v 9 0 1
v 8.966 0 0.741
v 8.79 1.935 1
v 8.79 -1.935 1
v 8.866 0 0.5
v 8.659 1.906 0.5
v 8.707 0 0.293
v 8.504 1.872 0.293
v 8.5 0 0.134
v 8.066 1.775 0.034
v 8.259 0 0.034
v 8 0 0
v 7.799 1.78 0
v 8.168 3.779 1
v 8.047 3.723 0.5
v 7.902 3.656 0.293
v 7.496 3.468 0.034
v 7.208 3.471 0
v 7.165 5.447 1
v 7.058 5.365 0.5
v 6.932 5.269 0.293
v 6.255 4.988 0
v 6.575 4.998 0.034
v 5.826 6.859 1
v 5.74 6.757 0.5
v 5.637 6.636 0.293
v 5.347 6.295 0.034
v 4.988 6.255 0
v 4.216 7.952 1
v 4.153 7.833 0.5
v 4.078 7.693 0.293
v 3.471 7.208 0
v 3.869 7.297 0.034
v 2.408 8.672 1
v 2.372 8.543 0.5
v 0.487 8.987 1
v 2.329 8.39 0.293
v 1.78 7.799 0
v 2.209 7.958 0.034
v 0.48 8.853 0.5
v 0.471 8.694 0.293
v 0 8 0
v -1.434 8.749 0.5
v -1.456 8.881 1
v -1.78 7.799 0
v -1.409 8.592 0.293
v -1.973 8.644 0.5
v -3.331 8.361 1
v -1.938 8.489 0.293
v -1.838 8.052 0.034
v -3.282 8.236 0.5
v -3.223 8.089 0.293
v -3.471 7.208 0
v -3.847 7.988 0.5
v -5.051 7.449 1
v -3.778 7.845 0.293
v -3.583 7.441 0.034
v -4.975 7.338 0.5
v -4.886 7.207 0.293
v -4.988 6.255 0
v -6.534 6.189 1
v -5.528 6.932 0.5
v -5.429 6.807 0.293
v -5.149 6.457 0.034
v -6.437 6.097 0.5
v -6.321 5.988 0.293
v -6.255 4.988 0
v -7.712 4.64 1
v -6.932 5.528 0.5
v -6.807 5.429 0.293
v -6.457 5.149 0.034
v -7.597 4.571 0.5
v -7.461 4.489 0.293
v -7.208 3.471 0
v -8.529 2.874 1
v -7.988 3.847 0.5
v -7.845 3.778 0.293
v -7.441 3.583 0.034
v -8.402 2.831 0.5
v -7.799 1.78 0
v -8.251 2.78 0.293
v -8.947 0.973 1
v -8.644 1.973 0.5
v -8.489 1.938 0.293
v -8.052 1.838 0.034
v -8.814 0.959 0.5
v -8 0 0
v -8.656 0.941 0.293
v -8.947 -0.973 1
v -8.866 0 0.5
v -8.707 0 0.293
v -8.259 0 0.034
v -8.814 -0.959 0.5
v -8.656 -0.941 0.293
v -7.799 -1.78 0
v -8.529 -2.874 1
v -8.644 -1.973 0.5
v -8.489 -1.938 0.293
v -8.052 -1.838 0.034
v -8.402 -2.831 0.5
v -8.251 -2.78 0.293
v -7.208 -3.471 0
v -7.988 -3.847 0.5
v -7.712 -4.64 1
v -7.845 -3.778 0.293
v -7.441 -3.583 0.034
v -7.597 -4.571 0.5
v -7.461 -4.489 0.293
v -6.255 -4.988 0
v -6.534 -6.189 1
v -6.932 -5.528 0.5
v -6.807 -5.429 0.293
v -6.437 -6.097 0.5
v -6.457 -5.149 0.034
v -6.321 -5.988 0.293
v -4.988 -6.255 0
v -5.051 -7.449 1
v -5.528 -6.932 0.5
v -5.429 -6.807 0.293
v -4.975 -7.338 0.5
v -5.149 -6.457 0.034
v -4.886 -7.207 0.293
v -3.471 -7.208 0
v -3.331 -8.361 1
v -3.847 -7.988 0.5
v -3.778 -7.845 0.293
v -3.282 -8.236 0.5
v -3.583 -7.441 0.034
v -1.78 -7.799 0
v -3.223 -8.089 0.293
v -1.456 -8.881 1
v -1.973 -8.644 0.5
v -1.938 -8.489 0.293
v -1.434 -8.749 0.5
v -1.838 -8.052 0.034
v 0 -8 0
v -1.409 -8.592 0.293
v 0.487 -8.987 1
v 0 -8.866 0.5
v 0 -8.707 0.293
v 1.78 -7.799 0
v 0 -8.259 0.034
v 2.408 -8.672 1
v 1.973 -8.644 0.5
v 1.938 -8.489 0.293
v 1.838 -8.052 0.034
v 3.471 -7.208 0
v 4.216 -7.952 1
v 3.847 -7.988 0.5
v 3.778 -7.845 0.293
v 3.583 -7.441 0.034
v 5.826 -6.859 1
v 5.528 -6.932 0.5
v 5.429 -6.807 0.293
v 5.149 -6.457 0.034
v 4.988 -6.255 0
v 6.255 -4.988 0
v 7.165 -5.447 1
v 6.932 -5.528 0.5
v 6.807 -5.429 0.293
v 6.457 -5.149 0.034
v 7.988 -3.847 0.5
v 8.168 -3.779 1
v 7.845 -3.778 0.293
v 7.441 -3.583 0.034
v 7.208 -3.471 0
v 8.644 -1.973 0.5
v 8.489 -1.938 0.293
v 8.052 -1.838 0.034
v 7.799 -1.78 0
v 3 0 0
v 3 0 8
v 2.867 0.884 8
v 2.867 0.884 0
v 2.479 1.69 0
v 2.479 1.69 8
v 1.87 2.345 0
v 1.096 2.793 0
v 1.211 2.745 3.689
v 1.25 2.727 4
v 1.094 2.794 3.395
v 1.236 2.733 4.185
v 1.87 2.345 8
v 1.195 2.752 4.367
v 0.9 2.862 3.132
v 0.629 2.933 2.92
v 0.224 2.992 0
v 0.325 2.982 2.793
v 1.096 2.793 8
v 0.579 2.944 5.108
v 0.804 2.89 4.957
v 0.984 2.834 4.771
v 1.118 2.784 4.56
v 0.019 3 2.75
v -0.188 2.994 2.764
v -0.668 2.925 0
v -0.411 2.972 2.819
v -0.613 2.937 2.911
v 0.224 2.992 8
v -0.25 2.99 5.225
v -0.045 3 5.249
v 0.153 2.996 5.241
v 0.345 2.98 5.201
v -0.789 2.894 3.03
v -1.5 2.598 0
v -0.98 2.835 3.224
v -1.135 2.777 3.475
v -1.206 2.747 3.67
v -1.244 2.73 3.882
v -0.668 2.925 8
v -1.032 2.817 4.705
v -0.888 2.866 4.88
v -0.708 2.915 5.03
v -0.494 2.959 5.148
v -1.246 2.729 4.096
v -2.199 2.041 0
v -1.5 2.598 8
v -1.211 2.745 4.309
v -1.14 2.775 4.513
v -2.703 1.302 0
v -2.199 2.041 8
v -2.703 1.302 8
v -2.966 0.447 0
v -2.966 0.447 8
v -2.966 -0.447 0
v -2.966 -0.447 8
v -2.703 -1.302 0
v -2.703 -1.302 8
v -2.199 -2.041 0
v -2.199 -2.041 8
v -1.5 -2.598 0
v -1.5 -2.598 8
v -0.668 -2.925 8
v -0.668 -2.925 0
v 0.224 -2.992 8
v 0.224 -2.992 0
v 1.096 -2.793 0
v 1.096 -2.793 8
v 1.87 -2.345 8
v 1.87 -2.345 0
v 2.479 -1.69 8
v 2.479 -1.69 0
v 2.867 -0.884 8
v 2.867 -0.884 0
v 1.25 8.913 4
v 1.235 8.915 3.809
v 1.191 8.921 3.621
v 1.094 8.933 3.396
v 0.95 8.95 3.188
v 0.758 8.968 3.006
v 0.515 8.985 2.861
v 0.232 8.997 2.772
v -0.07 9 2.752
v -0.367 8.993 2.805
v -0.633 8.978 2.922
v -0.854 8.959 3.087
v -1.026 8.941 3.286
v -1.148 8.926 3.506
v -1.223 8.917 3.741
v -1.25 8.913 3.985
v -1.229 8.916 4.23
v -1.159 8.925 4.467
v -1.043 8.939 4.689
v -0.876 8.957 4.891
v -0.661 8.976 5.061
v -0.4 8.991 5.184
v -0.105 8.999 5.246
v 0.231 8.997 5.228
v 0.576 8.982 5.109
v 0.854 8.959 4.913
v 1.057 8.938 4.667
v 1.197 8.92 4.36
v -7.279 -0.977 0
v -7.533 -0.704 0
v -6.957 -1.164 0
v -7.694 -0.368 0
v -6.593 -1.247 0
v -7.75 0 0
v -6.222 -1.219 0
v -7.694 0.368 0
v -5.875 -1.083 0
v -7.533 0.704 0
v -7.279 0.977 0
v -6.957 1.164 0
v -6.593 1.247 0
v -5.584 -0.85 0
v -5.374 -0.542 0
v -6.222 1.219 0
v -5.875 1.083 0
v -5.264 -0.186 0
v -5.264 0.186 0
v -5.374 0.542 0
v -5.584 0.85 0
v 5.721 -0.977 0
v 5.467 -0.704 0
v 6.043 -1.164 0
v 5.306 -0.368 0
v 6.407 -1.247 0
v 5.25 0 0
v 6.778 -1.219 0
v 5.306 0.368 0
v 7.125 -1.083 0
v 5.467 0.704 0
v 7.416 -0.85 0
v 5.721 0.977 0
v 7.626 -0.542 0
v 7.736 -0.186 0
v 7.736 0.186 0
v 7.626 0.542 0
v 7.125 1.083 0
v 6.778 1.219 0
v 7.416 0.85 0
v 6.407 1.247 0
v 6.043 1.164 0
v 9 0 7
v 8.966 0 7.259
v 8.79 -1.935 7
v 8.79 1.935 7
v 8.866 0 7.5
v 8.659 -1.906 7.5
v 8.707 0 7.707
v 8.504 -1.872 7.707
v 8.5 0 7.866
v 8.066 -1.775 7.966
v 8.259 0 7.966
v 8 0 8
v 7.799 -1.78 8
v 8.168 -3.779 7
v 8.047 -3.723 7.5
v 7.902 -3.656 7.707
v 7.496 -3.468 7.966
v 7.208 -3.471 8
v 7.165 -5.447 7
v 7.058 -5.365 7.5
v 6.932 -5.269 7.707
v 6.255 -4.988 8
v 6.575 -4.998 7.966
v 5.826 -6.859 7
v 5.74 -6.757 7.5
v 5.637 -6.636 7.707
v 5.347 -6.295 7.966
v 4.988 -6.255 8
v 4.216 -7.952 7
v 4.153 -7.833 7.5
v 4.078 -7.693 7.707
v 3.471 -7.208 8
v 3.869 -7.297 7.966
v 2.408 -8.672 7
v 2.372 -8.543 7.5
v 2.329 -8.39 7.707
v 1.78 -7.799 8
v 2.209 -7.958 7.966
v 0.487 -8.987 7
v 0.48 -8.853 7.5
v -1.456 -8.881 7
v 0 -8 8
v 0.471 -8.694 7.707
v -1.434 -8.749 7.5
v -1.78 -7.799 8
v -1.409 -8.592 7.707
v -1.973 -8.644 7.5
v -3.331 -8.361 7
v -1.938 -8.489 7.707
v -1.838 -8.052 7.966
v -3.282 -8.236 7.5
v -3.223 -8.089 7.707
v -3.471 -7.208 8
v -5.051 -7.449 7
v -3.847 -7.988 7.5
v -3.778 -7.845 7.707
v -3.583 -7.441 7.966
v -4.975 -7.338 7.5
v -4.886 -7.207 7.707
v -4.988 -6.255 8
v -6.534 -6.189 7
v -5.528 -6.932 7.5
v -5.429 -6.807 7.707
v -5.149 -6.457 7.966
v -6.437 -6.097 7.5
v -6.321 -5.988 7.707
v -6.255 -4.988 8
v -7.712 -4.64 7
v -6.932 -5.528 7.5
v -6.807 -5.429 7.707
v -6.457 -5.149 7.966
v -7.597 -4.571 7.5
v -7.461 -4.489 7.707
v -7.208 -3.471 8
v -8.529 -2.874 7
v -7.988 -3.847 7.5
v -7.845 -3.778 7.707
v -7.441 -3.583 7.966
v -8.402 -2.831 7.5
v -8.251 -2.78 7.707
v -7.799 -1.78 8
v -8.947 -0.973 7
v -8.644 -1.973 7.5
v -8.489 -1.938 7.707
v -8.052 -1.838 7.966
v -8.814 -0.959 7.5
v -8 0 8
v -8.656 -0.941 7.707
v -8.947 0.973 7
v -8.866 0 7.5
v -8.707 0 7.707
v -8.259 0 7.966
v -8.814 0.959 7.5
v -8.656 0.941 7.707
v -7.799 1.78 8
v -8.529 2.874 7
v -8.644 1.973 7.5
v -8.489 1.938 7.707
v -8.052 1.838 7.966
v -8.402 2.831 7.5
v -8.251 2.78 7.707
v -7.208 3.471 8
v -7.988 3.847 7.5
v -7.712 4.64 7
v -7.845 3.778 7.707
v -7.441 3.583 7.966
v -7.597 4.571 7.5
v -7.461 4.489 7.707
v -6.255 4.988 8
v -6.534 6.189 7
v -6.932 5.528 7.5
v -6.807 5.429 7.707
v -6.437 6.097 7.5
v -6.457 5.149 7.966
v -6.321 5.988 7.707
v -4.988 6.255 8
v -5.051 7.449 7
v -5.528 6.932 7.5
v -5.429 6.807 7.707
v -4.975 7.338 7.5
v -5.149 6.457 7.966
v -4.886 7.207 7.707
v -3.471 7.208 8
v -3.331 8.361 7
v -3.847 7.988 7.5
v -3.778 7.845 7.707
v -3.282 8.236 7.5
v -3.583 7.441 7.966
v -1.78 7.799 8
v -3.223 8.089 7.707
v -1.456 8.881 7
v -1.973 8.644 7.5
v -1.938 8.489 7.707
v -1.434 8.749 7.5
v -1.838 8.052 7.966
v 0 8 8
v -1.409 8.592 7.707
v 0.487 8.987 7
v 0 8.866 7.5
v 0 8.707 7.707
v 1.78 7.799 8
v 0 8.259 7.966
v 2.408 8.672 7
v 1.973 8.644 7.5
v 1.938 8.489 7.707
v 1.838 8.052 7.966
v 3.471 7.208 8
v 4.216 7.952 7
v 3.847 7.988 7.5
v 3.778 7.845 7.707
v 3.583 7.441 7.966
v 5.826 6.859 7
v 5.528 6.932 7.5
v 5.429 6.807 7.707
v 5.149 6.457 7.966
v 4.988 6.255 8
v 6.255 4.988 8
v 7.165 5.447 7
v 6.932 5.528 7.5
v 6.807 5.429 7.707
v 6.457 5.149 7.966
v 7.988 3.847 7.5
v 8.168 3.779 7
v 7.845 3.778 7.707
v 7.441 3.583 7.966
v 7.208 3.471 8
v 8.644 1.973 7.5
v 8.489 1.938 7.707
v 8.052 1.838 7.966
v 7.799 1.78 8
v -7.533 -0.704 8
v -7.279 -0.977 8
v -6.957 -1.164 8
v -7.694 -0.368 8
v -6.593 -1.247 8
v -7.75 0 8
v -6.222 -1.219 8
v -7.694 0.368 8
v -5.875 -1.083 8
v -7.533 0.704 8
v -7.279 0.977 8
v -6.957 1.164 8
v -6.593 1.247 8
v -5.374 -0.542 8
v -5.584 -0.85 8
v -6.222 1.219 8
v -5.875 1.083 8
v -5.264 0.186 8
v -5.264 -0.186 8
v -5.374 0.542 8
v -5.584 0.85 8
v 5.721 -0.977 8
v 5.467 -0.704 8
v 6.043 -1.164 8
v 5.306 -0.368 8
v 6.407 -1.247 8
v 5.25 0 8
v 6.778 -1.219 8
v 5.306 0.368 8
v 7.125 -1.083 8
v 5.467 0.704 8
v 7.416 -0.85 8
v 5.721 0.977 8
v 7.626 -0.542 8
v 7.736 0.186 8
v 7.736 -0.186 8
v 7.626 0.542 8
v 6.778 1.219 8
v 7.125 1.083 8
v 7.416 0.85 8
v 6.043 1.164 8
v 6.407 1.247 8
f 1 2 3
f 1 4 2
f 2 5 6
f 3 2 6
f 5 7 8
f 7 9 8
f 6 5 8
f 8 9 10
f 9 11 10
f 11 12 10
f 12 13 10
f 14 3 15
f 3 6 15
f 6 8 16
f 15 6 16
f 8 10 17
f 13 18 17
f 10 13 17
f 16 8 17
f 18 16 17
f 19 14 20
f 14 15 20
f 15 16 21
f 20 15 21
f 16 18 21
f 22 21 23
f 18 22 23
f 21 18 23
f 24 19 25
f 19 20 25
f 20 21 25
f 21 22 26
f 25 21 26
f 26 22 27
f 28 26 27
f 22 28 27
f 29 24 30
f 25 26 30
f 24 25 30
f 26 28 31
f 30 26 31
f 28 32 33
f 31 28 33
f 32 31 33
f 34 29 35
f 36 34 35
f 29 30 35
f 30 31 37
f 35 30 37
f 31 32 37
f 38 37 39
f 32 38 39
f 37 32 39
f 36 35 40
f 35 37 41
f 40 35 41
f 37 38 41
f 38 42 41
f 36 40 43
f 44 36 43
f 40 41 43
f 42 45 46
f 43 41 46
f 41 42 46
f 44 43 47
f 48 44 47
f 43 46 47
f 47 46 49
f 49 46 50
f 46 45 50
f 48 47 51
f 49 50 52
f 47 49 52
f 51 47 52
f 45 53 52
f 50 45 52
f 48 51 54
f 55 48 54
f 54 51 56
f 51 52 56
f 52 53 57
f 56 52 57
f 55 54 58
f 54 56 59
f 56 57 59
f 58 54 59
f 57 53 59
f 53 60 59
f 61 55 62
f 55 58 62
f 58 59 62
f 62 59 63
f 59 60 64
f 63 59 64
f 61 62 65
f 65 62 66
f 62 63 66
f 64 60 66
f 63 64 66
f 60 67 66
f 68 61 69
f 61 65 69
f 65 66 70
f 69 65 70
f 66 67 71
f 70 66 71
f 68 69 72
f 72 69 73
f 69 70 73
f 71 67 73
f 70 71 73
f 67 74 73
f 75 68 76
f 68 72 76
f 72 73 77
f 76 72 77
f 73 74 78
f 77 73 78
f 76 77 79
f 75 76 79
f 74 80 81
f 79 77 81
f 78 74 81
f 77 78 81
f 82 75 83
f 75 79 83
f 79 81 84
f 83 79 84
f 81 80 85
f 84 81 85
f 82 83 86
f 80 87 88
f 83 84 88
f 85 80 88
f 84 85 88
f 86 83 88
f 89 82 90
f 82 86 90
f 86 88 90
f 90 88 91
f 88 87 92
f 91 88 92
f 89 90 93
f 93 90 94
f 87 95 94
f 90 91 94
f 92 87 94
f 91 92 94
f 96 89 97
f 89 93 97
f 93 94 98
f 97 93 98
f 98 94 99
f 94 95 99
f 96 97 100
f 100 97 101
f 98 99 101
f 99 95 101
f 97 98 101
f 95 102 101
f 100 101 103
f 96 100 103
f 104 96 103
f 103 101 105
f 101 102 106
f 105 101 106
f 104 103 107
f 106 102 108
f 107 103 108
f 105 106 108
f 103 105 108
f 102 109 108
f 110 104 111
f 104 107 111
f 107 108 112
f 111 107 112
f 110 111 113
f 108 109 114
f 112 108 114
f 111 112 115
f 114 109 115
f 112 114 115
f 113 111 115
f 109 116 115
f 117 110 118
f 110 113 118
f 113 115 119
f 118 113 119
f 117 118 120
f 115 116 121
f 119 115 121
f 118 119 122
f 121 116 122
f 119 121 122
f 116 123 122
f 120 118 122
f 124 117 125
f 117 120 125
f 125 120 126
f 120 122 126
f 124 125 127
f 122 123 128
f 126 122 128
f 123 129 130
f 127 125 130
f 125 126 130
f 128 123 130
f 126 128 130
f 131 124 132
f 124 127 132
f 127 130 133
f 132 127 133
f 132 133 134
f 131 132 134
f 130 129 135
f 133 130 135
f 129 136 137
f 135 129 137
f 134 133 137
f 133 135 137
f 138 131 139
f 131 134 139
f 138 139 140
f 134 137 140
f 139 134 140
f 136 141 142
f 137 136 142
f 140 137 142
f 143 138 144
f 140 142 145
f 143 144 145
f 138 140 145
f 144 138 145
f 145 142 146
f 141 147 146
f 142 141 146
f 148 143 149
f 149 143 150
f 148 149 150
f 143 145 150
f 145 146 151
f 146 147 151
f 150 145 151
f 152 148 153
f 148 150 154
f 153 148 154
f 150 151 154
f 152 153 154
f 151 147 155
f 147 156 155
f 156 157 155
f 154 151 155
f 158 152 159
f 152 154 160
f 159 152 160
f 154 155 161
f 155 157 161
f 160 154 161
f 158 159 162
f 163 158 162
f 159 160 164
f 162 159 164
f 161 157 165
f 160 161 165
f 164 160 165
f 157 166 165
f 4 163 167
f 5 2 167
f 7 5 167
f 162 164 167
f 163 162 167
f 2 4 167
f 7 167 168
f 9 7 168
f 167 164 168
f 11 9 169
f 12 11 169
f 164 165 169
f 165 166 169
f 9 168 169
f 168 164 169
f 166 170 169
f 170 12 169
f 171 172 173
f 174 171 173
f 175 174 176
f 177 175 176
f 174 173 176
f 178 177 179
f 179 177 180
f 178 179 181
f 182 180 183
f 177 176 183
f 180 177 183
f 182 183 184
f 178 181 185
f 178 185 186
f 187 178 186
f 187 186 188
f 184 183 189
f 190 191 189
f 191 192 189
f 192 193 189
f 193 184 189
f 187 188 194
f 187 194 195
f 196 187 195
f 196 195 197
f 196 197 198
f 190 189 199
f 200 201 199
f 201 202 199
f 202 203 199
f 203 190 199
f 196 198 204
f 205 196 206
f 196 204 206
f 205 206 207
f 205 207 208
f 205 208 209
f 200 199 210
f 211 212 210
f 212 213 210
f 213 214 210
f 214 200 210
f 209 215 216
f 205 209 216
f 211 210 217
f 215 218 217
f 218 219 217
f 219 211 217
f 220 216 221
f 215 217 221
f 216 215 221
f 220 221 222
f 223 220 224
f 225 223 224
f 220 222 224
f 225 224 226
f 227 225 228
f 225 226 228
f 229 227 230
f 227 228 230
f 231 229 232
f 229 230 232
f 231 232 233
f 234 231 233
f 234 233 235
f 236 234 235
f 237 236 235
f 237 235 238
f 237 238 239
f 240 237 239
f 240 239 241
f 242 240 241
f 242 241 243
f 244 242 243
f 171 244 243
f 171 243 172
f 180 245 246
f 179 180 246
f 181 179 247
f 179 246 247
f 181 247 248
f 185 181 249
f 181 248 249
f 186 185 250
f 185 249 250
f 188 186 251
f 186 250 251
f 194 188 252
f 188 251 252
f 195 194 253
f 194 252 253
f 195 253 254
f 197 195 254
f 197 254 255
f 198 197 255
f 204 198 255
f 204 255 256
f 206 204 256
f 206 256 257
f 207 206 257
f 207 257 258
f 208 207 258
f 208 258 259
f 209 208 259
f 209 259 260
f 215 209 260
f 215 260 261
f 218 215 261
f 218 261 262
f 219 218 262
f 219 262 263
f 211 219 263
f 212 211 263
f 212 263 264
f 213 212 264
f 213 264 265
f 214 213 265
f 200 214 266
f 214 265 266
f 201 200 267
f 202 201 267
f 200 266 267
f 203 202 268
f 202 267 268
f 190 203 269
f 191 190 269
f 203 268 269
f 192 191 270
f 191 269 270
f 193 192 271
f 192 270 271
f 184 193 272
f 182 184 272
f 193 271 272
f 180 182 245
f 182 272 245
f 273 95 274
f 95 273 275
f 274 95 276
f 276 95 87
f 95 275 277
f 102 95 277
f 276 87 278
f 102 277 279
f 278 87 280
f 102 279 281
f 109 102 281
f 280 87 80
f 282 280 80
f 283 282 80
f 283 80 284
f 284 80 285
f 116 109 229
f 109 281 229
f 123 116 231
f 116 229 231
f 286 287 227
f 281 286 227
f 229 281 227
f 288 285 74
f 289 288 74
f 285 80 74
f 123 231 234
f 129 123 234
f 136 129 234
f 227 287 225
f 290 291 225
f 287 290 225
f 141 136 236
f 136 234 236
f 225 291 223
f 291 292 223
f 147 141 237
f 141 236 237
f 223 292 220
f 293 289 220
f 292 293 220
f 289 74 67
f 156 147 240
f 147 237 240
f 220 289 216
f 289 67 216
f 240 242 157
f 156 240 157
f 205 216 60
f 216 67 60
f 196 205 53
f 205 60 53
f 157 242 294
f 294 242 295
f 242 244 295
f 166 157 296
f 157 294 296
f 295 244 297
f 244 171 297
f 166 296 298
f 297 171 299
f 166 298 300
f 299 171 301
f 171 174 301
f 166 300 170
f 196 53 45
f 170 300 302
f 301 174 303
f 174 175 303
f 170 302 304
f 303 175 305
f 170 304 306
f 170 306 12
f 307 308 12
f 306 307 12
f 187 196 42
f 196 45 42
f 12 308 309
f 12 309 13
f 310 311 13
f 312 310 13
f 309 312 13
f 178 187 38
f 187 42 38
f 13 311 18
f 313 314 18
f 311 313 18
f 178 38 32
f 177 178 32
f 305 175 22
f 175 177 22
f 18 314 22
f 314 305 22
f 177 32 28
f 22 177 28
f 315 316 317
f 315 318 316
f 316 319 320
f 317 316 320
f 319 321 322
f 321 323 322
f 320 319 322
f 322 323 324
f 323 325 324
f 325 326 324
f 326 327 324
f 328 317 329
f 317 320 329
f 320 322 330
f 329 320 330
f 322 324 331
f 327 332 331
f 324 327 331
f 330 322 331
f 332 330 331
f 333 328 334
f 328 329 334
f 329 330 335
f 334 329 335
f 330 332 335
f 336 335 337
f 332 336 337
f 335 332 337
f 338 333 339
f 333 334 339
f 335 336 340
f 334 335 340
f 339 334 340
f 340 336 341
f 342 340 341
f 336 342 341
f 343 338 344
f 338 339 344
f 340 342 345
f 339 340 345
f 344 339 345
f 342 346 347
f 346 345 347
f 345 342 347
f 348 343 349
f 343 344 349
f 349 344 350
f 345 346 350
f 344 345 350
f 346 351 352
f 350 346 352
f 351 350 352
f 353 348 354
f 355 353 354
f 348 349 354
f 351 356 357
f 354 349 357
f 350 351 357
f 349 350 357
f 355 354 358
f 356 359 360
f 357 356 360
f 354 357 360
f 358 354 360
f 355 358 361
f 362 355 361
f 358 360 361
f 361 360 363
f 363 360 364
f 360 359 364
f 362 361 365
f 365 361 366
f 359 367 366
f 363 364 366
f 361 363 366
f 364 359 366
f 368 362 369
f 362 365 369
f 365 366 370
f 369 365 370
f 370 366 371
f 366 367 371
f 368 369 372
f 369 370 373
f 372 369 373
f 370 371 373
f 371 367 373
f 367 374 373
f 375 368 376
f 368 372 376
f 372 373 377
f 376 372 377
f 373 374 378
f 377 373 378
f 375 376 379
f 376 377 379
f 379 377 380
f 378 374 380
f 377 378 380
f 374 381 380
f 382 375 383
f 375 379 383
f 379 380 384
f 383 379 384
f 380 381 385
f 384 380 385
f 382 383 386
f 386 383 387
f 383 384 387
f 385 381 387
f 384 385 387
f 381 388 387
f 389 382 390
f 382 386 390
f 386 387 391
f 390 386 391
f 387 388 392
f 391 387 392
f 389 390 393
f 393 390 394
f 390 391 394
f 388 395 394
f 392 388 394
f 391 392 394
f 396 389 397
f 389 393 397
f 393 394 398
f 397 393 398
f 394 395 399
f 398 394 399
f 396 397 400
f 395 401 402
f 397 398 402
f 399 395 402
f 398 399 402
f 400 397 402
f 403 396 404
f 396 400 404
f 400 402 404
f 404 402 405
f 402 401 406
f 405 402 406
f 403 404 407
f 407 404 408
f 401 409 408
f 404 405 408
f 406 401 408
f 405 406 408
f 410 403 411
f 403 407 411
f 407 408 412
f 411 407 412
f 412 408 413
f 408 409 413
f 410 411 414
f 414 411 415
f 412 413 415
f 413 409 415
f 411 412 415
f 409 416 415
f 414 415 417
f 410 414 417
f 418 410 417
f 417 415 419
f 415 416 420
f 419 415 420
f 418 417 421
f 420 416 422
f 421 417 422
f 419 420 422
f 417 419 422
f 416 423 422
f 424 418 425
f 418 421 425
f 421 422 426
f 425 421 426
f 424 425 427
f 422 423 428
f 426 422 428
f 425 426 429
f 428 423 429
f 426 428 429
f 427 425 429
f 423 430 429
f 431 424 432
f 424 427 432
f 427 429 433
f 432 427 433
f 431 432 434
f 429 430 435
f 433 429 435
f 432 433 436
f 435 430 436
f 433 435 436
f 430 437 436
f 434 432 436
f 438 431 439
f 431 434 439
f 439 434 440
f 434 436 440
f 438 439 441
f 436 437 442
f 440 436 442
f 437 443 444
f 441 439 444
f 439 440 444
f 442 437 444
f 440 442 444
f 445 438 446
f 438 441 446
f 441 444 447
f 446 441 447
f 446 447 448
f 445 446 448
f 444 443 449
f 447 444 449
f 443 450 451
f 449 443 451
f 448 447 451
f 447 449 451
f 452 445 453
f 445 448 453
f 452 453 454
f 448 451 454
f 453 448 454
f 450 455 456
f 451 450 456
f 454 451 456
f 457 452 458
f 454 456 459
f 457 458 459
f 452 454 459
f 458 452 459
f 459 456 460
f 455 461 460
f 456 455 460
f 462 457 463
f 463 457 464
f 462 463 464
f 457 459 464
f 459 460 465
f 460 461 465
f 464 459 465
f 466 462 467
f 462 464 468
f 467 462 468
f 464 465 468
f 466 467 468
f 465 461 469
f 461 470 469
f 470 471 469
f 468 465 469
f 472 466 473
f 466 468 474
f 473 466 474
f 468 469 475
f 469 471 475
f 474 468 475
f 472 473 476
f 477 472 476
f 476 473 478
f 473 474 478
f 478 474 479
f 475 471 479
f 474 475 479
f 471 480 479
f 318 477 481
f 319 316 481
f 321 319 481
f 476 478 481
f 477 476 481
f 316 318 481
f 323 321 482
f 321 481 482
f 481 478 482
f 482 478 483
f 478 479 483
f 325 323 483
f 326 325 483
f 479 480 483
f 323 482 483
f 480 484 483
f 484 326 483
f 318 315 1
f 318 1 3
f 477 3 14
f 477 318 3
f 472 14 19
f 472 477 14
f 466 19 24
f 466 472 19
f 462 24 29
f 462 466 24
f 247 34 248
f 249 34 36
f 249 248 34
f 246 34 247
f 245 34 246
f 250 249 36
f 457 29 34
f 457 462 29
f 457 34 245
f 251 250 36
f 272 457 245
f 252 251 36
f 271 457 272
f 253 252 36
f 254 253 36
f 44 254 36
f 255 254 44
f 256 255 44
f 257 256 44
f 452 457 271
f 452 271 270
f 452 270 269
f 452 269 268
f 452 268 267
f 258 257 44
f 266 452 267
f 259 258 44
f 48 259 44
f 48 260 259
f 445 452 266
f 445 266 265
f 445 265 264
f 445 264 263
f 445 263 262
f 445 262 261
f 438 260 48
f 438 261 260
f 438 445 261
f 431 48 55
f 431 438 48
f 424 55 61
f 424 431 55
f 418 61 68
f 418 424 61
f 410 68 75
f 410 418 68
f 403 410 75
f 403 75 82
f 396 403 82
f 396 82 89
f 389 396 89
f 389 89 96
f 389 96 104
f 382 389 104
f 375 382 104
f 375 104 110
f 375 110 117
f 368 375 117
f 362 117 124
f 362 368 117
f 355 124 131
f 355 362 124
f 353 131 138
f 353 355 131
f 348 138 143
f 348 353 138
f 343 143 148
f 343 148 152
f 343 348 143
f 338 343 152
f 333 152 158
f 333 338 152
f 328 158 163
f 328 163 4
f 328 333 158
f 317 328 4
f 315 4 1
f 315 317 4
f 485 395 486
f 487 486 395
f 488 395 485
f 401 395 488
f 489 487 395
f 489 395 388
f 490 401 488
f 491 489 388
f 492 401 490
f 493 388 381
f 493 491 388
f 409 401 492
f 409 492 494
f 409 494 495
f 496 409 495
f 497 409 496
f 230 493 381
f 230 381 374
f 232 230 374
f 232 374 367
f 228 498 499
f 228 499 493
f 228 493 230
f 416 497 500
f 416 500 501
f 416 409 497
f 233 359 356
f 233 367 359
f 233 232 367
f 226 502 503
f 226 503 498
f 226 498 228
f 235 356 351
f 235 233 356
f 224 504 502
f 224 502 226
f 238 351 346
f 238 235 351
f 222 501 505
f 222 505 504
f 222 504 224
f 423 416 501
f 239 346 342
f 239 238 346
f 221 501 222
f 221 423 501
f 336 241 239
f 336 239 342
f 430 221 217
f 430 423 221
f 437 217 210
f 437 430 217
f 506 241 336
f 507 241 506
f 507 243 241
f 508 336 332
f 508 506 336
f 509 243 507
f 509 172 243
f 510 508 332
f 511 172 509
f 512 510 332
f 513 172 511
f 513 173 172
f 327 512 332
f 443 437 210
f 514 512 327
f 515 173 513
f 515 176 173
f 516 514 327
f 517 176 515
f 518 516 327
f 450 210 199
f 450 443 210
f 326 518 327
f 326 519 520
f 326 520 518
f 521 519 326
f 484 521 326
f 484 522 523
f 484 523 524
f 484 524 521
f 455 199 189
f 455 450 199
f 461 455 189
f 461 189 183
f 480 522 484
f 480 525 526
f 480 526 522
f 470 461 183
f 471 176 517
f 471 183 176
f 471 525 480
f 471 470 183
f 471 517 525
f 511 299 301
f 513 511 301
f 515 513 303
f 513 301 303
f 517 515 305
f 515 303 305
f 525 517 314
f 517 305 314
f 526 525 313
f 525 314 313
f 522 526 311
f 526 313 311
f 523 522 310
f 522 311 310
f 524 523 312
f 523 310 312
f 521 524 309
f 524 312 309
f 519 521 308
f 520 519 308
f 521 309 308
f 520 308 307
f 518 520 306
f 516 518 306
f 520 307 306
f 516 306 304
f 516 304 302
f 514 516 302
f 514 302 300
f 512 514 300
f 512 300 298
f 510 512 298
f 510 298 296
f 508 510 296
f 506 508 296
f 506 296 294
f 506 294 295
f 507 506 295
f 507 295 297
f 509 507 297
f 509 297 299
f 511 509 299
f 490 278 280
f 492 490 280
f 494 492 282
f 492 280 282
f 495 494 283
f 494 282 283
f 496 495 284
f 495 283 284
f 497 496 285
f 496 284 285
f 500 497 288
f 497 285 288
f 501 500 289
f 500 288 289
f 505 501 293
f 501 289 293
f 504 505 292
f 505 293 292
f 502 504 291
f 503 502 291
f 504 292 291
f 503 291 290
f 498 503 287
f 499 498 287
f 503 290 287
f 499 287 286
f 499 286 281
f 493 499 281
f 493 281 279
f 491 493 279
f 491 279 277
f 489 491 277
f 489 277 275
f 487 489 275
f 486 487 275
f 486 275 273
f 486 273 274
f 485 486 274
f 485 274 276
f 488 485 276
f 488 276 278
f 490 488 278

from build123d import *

# Parameters (mm, degrees)
SKETCH1_W                = 18
SKETCH1_H                = 18
BOSS_EXTRUDE1_DEPTH      = 8
M3_TAPPED_HOLE1_D        = 2.5
F_6_0_6_DIAMETER_HOLE1_D = 6
M3_TAPPED_HOLE2_REACH    = 23.656
M3_TAPPED_HOLE2_BORE_R   = 1.25
SKETCH15_R               = 12.727922061
SKETCH15_R_2             = 9
CUT_EXTRUDE1_DEPTH       = 10
FILLET1_R                = 1


with BuildPart() as part:
    # Sketch1 → Boss-Extrude1 (new body)
    with BuildSketch(Plane.XY):
        Rectangle(SKETCH1_W, SKETCH1_H)
    extrude(amount=BOSS_EXTRUDE1_DEPTH)

    # M3 Tapped Hole1 (through all)
    with Locations(Plane.XY.offset(8)):
        with Locations((6.5, 0), (-6.5, 0)):
            Hole(M3_TAPPED_HOLE1_D / 2)

    # Ø6.0 (6) Diameter Hole1 (through all)
    with Locations(Plane(origin=(0, 0, 0), x_dir=(-1, 0, 0), z_dir=(0, 0, -1))):
        with Locations((0, 0)):
            Hole(F_6_0_6_DIAMETER_HOLE1_D / 2)

    # M3 Tapped Hole2 bore → M3 Tapped Hole2 (cut, up to next)
    with BuildSketch(Plane(origin=(0, 9, 0), x_dir=(1, 0, 0), z_dir=(0, 1, 0)), mode=Mode.PRIVATE) as m3_tapped_hole2_sk1:
        with Locations((0, -4)):
            Circle(M3_TAPPED_HOLE2_BORE_R)
    m3_tapped_hole2_tool1 = extrude(m3_tapped_hole2_sk1.sketch, amount=-M3_TAPPED_HOLE2_REACH, mode=Mode.PRIVATE) & part.part
    add(m3_tapped_hole2_tool1.solids().sort_by_distance((0, 9, 4))[0], mode=Mode.SUBTRACT)

    # Sketch15 → Cut-Extrude1 (cut)
    with BuildSketch(Plane.XY.offset(8)):
        Circle(SKETCH15_R)
        Circle(SKETCH15_R_2, mode=Mode.SUBTRACT)
    extrude(amount=-CUT_EXTRUDE1_DEPTH, mode=Mode.SUBTRACT)

    # Fillet1
    fillet1_edges = [part.edges().sort_by_distance(p)[0] for p in [
        (-9, 0, 0),
        (-9, 0, 8),
    ]]
    fillet(fillet1_edges, radius=FILLET1_R)


solid = part.part
